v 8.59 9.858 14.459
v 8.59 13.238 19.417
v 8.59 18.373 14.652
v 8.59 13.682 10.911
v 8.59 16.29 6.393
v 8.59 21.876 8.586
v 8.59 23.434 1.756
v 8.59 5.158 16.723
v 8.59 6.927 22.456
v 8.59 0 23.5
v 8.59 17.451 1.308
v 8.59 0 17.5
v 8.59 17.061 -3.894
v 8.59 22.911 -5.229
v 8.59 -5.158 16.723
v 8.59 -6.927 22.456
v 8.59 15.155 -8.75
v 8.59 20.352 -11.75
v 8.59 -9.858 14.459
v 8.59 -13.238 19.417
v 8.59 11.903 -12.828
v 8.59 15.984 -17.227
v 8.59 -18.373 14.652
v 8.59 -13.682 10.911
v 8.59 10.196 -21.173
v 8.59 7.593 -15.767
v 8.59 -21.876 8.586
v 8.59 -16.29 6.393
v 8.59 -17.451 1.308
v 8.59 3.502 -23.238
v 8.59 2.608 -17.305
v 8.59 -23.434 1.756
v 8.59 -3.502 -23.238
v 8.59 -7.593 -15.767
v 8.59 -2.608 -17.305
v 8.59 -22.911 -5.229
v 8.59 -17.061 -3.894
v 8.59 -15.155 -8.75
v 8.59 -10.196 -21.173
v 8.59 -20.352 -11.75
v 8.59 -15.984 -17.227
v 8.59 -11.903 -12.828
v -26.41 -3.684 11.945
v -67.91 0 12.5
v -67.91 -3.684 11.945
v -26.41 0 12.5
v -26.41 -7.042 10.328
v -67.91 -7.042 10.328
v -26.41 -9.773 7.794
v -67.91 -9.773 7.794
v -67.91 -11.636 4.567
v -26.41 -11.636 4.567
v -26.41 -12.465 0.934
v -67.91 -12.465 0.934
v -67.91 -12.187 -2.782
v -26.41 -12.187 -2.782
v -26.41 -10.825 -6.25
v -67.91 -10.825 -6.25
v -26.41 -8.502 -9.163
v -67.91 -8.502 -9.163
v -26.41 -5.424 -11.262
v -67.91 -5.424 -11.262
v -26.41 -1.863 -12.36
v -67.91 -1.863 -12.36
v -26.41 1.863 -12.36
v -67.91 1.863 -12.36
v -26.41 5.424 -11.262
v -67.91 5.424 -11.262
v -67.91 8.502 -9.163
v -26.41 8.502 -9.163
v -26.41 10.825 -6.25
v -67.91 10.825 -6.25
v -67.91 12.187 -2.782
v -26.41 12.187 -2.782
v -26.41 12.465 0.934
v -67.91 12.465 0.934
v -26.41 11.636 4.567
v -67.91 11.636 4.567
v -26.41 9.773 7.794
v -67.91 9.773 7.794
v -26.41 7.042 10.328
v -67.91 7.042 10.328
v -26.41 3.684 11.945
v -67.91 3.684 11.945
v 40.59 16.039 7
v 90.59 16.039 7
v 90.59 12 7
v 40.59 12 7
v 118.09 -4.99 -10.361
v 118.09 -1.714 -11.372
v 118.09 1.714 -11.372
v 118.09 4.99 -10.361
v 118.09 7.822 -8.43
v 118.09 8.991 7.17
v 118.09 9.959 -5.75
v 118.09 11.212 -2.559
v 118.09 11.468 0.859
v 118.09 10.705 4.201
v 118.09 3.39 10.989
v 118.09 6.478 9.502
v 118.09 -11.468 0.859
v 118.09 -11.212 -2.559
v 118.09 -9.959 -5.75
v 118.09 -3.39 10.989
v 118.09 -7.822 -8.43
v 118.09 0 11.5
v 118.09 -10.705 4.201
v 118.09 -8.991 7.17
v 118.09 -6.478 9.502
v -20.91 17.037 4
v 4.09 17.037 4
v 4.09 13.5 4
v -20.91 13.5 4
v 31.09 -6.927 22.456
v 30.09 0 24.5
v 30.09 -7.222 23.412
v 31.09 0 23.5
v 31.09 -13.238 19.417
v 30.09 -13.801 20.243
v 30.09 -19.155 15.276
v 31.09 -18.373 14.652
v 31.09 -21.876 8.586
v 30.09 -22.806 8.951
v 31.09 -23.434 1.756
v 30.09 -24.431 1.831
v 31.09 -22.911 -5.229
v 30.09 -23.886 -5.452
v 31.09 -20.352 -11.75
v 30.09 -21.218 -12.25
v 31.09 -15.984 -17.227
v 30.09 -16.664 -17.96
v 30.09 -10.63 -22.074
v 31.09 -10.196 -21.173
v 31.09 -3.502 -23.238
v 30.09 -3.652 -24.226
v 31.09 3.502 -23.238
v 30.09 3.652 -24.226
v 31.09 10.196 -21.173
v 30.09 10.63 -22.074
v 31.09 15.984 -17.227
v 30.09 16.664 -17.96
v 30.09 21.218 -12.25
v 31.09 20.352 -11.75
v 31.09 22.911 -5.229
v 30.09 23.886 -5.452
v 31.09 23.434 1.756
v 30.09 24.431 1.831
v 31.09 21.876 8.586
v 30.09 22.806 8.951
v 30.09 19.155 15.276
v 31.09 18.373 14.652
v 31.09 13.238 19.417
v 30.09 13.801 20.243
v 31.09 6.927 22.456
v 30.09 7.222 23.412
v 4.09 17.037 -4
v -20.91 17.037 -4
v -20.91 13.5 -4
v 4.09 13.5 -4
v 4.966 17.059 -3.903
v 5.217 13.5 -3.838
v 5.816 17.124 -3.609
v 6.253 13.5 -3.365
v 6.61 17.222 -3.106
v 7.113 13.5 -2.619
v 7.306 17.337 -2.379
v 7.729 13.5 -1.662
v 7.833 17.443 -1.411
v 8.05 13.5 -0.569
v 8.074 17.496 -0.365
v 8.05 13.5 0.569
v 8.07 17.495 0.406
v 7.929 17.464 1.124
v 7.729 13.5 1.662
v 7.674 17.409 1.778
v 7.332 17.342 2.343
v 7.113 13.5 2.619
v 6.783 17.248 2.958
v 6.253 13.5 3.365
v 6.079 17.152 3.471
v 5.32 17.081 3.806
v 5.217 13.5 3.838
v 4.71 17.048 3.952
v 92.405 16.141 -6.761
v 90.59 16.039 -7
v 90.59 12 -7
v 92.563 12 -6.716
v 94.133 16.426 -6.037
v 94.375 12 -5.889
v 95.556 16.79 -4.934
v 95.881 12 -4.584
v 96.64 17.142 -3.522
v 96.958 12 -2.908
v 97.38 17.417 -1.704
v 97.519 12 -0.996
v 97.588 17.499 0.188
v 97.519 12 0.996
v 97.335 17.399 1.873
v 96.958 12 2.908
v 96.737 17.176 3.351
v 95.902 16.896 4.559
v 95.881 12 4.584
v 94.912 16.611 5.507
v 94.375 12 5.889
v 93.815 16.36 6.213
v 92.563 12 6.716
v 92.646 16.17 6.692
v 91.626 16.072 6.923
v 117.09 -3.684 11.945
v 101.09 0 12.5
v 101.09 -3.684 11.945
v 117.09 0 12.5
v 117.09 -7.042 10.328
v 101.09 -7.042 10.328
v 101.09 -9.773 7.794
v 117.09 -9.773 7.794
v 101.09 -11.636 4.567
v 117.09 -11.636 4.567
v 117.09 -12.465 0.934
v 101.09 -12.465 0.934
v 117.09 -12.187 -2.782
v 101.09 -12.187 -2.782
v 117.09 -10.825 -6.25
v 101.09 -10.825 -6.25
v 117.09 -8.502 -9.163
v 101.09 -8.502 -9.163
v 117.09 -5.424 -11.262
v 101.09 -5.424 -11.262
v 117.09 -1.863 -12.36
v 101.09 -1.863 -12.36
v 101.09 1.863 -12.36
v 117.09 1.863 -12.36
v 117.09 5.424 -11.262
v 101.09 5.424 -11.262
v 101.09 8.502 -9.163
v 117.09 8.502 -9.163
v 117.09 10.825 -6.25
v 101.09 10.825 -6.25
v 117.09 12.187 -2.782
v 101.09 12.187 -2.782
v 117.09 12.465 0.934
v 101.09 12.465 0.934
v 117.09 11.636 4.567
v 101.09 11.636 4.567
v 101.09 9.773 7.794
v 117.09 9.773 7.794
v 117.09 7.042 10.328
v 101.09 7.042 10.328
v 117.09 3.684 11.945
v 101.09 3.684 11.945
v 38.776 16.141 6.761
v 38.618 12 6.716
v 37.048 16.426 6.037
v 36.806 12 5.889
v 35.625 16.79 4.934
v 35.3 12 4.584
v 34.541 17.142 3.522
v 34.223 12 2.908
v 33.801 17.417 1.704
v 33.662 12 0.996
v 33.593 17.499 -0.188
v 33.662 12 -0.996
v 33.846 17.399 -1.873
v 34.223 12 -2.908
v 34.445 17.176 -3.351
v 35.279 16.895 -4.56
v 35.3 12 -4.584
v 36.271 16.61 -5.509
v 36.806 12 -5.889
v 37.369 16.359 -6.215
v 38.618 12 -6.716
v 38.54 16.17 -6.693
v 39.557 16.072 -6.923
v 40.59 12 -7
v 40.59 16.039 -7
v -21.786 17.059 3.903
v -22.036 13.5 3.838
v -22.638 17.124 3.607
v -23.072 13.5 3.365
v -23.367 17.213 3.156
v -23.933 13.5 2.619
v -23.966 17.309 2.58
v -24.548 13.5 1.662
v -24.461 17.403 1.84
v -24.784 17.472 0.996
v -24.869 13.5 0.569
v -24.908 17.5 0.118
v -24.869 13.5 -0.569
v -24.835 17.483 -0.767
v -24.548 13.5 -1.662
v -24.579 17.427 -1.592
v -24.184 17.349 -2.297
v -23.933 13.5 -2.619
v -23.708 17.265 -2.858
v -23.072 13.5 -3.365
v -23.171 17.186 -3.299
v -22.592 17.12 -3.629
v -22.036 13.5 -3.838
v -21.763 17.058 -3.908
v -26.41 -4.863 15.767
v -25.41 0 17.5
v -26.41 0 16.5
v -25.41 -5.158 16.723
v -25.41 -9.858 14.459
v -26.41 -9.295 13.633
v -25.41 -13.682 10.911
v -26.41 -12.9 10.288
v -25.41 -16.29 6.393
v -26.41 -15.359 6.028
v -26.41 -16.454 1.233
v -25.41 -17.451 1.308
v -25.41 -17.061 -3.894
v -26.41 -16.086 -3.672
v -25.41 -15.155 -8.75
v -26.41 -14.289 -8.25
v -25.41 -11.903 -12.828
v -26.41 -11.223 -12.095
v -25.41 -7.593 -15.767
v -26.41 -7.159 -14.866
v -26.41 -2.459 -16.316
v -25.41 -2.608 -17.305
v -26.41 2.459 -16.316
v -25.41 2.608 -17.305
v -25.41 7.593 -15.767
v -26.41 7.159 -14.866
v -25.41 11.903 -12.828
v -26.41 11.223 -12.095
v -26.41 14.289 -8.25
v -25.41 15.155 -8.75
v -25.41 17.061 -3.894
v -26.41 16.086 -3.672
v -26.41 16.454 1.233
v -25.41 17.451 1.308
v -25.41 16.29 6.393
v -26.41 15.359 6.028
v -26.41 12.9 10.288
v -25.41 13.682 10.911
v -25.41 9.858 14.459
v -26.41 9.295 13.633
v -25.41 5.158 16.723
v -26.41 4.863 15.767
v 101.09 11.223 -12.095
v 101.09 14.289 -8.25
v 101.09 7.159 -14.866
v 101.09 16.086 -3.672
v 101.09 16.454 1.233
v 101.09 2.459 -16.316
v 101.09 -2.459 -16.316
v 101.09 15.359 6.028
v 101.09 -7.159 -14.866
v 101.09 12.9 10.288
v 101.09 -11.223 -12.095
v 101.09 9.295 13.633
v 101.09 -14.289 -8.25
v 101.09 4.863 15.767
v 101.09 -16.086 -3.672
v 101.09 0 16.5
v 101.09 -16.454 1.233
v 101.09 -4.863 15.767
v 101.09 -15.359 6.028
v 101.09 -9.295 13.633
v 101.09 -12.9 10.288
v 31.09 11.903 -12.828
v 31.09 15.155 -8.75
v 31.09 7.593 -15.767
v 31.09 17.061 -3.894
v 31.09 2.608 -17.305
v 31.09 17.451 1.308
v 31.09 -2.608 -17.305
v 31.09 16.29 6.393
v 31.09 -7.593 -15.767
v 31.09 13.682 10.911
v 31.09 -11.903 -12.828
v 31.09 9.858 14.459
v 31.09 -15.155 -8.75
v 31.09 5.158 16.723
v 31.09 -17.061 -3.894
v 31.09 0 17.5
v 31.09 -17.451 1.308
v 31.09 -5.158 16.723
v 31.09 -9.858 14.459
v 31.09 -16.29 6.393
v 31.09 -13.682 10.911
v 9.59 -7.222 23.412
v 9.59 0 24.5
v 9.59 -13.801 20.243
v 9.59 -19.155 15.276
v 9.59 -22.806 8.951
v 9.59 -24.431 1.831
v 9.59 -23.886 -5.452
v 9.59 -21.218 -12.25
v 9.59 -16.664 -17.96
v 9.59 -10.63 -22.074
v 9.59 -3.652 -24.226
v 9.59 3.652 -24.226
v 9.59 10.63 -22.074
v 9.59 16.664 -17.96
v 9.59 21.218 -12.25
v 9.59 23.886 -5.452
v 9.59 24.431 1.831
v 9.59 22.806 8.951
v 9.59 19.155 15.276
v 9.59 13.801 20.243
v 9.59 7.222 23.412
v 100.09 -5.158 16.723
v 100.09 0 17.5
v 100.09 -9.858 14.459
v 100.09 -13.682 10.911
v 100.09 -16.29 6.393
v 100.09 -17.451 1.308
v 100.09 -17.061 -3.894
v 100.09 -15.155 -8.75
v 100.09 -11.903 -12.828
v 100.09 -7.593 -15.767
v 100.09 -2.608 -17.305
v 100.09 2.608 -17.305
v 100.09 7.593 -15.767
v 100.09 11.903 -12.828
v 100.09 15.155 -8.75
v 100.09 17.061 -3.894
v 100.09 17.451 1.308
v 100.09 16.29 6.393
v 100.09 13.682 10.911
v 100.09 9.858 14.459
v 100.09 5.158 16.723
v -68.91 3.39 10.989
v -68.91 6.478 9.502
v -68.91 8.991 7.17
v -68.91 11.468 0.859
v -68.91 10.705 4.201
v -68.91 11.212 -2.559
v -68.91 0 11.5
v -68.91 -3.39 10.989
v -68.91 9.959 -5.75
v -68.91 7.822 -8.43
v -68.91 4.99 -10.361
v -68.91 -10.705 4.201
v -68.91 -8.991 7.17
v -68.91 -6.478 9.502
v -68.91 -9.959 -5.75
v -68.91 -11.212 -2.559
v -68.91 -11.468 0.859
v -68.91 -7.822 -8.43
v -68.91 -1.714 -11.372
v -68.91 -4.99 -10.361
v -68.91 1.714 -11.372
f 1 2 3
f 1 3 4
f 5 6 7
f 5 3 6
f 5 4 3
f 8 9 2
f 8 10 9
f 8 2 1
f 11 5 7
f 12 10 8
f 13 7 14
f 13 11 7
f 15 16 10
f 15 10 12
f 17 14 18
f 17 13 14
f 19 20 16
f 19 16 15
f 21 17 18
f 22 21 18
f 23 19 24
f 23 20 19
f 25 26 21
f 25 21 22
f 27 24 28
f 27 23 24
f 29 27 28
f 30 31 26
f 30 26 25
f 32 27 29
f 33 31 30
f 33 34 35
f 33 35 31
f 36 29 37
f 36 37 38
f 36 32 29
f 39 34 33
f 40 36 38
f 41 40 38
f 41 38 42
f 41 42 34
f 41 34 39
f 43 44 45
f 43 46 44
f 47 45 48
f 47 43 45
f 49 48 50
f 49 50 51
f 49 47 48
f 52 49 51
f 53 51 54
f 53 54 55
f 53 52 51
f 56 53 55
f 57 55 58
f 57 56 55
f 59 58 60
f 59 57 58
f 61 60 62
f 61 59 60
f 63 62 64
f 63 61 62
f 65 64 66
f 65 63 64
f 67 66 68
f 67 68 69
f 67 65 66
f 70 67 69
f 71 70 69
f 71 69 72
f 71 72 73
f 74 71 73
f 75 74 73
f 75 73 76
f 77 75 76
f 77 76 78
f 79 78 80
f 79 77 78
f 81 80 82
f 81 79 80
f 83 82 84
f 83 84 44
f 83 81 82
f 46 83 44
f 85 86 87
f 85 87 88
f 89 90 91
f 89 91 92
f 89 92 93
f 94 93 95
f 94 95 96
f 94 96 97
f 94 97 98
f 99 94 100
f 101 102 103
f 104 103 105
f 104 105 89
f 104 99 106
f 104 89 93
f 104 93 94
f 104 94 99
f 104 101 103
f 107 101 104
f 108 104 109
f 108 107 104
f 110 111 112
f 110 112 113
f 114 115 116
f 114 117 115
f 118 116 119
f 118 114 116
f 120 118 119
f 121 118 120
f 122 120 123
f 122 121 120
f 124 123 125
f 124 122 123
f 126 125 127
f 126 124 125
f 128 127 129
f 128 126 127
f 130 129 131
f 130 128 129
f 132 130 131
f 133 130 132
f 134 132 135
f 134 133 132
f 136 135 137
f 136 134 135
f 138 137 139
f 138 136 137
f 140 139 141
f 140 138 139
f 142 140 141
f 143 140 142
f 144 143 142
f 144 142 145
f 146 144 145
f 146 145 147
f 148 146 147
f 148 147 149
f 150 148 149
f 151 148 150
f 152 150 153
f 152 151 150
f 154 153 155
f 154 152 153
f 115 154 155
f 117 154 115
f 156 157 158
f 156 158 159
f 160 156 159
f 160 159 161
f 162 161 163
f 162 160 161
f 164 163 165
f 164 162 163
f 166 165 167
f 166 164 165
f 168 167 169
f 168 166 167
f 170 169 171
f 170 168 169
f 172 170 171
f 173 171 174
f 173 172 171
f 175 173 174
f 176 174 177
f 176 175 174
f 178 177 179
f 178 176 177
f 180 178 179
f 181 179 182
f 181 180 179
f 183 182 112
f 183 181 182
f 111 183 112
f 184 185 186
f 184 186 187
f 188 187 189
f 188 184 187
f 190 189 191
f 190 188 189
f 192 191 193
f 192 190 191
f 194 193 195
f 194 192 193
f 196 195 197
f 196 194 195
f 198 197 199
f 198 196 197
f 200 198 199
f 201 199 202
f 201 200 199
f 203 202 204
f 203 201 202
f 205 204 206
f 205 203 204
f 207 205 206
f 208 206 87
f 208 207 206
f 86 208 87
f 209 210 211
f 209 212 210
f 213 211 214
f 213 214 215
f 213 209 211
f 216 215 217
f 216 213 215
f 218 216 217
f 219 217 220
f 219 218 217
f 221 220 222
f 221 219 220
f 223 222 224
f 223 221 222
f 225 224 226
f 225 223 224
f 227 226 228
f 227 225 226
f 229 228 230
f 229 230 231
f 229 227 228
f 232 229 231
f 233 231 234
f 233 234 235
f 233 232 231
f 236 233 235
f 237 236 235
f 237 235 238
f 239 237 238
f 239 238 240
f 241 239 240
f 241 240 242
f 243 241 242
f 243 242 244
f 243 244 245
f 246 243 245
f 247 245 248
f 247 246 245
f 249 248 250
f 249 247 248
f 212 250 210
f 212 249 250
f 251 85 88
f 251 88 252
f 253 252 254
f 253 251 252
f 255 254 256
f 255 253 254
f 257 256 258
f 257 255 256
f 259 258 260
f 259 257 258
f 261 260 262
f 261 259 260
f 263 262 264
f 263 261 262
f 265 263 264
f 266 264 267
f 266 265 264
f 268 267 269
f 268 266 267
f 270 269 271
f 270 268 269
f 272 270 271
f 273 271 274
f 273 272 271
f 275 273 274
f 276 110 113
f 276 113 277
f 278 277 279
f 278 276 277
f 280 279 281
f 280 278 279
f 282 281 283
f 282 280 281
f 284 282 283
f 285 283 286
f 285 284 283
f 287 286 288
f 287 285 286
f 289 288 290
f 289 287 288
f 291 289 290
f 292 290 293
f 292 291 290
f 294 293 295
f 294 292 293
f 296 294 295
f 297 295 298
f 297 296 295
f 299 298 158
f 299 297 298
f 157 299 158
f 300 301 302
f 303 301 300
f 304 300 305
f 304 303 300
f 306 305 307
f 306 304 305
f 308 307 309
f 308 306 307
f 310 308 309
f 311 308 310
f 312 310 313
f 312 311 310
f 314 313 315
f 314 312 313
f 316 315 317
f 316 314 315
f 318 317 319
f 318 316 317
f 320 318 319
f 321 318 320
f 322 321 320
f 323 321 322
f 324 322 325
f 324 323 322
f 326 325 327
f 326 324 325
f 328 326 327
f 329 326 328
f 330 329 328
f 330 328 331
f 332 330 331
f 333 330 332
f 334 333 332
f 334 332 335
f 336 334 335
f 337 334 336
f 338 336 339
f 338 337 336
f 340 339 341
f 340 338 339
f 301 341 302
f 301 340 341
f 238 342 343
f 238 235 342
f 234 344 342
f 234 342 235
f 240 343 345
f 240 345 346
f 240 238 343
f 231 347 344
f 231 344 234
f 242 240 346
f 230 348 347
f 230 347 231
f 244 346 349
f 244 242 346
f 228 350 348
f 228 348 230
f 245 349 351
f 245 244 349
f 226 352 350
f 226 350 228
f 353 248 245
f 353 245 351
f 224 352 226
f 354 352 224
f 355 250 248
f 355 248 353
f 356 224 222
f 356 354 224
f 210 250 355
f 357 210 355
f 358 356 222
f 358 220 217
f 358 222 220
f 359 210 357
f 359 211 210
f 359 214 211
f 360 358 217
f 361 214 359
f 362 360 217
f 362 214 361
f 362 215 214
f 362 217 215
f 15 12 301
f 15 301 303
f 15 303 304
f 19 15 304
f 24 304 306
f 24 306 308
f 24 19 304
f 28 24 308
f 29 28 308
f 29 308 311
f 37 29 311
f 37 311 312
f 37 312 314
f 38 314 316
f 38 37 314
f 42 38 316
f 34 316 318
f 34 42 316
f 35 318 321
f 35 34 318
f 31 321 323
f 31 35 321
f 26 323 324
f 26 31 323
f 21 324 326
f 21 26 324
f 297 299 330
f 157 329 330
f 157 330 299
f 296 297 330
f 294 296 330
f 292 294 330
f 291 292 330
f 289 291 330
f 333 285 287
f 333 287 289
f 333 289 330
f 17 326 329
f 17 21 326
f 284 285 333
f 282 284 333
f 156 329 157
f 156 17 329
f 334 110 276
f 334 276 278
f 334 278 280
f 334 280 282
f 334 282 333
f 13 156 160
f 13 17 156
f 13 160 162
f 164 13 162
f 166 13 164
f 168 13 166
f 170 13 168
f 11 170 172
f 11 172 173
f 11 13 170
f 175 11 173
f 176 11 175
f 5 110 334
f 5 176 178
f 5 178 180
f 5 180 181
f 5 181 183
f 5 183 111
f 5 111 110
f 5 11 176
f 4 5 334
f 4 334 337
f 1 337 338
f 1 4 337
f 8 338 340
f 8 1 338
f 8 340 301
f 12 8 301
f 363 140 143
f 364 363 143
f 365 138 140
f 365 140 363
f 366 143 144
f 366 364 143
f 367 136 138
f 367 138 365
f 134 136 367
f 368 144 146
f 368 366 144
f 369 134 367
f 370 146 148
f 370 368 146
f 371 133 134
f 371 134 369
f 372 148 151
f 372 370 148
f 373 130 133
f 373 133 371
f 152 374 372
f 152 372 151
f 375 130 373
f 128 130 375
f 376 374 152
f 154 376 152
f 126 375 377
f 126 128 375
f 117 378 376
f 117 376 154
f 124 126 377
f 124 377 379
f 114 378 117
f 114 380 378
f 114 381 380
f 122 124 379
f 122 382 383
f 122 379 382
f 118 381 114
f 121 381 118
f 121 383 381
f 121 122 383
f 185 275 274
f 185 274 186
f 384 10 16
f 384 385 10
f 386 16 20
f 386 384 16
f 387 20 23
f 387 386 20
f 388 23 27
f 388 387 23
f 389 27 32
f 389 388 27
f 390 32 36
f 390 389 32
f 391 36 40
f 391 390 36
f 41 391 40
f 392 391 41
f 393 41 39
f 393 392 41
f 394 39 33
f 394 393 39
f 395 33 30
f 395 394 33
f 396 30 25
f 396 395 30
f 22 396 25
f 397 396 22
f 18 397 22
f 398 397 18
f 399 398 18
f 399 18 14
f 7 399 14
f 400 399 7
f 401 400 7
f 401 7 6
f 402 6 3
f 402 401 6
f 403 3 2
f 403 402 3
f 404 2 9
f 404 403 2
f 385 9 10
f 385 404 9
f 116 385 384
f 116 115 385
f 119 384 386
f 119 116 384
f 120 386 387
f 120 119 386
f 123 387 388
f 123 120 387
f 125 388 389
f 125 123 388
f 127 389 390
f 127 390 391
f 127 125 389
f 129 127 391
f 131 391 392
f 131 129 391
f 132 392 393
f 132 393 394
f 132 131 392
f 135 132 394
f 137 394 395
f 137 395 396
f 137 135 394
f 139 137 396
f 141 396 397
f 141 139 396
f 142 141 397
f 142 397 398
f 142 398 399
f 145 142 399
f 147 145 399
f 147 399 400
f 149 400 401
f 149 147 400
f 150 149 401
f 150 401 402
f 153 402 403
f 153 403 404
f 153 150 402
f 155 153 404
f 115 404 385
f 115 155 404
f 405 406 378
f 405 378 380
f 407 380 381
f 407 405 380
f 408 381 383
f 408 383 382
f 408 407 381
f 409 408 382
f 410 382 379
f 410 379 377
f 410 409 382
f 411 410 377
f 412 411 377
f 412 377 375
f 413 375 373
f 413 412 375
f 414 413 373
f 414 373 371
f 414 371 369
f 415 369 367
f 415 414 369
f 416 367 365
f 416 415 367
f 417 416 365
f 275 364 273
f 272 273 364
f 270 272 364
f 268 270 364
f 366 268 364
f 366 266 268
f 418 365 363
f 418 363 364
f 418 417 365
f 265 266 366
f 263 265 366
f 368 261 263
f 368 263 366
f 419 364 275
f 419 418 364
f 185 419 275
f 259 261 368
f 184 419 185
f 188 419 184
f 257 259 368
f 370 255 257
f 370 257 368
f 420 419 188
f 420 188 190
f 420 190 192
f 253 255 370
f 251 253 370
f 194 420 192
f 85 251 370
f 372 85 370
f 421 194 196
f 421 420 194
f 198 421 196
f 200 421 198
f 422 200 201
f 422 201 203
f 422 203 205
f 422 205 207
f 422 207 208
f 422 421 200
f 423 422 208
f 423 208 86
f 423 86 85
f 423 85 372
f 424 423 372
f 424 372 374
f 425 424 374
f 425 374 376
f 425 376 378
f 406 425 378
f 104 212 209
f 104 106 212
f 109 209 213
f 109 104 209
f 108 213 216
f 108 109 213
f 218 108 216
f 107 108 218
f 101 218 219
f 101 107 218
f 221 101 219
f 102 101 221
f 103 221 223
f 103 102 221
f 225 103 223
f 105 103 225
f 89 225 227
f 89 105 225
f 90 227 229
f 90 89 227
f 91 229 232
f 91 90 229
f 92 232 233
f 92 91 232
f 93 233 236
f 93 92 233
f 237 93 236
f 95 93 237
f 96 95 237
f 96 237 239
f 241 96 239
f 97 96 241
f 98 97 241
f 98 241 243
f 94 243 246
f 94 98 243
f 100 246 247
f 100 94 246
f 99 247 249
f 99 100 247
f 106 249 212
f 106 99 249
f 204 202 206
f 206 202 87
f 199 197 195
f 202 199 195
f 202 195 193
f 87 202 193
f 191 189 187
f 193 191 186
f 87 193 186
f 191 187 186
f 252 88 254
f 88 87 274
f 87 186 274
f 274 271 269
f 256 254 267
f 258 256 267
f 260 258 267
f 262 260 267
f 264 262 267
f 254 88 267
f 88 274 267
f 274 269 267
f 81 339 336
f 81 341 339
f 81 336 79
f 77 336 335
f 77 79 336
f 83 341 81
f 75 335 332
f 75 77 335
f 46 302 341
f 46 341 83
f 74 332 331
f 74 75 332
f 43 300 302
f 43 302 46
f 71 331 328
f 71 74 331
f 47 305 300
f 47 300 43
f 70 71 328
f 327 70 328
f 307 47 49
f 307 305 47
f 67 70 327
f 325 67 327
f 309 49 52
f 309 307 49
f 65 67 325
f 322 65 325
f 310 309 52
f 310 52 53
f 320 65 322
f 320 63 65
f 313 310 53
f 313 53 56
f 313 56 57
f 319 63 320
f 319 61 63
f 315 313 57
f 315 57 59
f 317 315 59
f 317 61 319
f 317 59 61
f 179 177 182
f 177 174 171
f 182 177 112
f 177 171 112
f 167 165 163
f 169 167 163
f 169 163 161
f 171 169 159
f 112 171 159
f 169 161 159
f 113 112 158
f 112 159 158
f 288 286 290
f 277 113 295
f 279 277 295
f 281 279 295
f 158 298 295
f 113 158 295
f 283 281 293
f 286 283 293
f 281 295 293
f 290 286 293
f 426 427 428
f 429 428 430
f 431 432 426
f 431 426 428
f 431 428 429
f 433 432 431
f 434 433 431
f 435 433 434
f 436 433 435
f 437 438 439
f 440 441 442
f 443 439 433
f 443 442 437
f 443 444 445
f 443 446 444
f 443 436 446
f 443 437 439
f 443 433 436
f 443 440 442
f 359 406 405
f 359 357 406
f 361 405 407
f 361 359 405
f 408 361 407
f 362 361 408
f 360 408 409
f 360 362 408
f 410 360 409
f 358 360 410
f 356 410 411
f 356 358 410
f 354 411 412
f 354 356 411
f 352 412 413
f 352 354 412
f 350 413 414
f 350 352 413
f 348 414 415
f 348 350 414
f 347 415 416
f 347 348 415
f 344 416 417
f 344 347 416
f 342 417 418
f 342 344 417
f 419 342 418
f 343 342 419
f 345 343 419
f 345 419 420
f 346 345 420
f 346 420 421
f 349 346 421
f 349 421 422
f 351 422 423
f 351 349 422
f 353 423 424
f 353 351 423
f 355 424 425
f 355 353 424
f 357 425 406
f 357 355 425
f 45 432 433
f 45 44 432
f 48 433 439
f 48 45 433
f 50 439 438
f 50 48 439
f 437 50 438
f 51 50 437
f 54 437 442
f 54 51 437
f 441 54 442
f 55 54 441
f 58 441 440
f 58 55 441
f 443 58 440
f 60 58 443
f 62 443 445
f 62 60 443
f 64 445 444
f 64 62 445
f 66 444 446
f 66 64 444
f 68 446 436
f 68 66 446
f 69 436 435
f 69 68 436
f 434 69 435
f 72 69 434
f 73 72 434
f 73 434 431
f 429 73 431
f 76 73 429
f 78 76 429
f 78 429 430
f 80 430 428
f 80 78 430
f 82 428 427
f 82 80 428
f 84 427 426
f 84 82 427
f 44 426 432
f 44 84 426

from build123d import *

# Parameters (mm, degrees)
CUT_EXTRUDE1_DEPTH = 4
CUT_EXTRUDE2_DEPTH = 5.5


with BuildPart() as part:
    # Sketch1 → Revolve1 (revolve)
    with BuildSketch(Plane.XY, mode=Mode.PRIVATE) as revolve1_sk:
        Polygon((-68.909512761, 0), (-68.909512761, 11.5), (-67.909512761, 12.5), (-26.409512761, 12.5), (-26.409512761, 16.5), (-25.409512761, 17.5), (8.590487239, 17.5), (8.590487239, 23.5), (9.590487239, 24.5), (30.090487239, 24.5), (31.090487239, 23.5), (31.090487239, 17.5), (100.090487239, 17.5), (101.090487239, 16.5), (101.090487239, 12.5), (117.090487239, 12.5), (118.090487239, 11.5), (118.090487239, 0), align=None)
    revolve(revolve1_sk.sketch.rotate(Axis((-92.22737819, 0, 0), (1, 0, 0)), 90), axis=Axis((-92.22737819, 0, 0), (1, 0, 0)))

    # Sketch2 → Cut-Extrude1 (cut)
    with BuildSketch(Plane(origin=(0, 17.5, 0), x_dir=(1, 0, 0), z_dir=(0, 1, 0))):
        with BuildLine():
            Line((-20.909512761, 4), (4.090487239, 4))
            ThreePointArc((4.090487239, 4), (8.090487239, 0), (4.090487239, -4))
            Line((4.090487239, -4), (-20.909512761, -4))
            ThreePointArc((-20.909512761, -4), (-24.909512761, 0), (-20.909512761, 4))
        make_face()
    extrude(amount=-CUT_EXTRUDE1_DEPTH, mode=Mode.SUBTRACT)

    # Sketch3 → Cut-Extrude2 (cut)
    with BuildSketch(Plane(origin=(0, 17.5, 0), x_dir=(1, 0, 0), z_dir=(0, 1, 0))):
        with BuildLine():
            Line((40.590487239, 7), (90.590487239, 7))
            ThreePointArc((90.590487239, 7), (97.590487239, 0), (90.590487239, -7))
            Line((90.590487239, -7), (40.590487239, -7))
            ThreePointArc((40.590487239, -7), (33.590487239, 0), (40.590487239, 7))
        make_face()
    extrude(amount=-CUT_EXTRUDE2_DEPTH, mode=Mode.SUBTRACT)


solid = part.part
